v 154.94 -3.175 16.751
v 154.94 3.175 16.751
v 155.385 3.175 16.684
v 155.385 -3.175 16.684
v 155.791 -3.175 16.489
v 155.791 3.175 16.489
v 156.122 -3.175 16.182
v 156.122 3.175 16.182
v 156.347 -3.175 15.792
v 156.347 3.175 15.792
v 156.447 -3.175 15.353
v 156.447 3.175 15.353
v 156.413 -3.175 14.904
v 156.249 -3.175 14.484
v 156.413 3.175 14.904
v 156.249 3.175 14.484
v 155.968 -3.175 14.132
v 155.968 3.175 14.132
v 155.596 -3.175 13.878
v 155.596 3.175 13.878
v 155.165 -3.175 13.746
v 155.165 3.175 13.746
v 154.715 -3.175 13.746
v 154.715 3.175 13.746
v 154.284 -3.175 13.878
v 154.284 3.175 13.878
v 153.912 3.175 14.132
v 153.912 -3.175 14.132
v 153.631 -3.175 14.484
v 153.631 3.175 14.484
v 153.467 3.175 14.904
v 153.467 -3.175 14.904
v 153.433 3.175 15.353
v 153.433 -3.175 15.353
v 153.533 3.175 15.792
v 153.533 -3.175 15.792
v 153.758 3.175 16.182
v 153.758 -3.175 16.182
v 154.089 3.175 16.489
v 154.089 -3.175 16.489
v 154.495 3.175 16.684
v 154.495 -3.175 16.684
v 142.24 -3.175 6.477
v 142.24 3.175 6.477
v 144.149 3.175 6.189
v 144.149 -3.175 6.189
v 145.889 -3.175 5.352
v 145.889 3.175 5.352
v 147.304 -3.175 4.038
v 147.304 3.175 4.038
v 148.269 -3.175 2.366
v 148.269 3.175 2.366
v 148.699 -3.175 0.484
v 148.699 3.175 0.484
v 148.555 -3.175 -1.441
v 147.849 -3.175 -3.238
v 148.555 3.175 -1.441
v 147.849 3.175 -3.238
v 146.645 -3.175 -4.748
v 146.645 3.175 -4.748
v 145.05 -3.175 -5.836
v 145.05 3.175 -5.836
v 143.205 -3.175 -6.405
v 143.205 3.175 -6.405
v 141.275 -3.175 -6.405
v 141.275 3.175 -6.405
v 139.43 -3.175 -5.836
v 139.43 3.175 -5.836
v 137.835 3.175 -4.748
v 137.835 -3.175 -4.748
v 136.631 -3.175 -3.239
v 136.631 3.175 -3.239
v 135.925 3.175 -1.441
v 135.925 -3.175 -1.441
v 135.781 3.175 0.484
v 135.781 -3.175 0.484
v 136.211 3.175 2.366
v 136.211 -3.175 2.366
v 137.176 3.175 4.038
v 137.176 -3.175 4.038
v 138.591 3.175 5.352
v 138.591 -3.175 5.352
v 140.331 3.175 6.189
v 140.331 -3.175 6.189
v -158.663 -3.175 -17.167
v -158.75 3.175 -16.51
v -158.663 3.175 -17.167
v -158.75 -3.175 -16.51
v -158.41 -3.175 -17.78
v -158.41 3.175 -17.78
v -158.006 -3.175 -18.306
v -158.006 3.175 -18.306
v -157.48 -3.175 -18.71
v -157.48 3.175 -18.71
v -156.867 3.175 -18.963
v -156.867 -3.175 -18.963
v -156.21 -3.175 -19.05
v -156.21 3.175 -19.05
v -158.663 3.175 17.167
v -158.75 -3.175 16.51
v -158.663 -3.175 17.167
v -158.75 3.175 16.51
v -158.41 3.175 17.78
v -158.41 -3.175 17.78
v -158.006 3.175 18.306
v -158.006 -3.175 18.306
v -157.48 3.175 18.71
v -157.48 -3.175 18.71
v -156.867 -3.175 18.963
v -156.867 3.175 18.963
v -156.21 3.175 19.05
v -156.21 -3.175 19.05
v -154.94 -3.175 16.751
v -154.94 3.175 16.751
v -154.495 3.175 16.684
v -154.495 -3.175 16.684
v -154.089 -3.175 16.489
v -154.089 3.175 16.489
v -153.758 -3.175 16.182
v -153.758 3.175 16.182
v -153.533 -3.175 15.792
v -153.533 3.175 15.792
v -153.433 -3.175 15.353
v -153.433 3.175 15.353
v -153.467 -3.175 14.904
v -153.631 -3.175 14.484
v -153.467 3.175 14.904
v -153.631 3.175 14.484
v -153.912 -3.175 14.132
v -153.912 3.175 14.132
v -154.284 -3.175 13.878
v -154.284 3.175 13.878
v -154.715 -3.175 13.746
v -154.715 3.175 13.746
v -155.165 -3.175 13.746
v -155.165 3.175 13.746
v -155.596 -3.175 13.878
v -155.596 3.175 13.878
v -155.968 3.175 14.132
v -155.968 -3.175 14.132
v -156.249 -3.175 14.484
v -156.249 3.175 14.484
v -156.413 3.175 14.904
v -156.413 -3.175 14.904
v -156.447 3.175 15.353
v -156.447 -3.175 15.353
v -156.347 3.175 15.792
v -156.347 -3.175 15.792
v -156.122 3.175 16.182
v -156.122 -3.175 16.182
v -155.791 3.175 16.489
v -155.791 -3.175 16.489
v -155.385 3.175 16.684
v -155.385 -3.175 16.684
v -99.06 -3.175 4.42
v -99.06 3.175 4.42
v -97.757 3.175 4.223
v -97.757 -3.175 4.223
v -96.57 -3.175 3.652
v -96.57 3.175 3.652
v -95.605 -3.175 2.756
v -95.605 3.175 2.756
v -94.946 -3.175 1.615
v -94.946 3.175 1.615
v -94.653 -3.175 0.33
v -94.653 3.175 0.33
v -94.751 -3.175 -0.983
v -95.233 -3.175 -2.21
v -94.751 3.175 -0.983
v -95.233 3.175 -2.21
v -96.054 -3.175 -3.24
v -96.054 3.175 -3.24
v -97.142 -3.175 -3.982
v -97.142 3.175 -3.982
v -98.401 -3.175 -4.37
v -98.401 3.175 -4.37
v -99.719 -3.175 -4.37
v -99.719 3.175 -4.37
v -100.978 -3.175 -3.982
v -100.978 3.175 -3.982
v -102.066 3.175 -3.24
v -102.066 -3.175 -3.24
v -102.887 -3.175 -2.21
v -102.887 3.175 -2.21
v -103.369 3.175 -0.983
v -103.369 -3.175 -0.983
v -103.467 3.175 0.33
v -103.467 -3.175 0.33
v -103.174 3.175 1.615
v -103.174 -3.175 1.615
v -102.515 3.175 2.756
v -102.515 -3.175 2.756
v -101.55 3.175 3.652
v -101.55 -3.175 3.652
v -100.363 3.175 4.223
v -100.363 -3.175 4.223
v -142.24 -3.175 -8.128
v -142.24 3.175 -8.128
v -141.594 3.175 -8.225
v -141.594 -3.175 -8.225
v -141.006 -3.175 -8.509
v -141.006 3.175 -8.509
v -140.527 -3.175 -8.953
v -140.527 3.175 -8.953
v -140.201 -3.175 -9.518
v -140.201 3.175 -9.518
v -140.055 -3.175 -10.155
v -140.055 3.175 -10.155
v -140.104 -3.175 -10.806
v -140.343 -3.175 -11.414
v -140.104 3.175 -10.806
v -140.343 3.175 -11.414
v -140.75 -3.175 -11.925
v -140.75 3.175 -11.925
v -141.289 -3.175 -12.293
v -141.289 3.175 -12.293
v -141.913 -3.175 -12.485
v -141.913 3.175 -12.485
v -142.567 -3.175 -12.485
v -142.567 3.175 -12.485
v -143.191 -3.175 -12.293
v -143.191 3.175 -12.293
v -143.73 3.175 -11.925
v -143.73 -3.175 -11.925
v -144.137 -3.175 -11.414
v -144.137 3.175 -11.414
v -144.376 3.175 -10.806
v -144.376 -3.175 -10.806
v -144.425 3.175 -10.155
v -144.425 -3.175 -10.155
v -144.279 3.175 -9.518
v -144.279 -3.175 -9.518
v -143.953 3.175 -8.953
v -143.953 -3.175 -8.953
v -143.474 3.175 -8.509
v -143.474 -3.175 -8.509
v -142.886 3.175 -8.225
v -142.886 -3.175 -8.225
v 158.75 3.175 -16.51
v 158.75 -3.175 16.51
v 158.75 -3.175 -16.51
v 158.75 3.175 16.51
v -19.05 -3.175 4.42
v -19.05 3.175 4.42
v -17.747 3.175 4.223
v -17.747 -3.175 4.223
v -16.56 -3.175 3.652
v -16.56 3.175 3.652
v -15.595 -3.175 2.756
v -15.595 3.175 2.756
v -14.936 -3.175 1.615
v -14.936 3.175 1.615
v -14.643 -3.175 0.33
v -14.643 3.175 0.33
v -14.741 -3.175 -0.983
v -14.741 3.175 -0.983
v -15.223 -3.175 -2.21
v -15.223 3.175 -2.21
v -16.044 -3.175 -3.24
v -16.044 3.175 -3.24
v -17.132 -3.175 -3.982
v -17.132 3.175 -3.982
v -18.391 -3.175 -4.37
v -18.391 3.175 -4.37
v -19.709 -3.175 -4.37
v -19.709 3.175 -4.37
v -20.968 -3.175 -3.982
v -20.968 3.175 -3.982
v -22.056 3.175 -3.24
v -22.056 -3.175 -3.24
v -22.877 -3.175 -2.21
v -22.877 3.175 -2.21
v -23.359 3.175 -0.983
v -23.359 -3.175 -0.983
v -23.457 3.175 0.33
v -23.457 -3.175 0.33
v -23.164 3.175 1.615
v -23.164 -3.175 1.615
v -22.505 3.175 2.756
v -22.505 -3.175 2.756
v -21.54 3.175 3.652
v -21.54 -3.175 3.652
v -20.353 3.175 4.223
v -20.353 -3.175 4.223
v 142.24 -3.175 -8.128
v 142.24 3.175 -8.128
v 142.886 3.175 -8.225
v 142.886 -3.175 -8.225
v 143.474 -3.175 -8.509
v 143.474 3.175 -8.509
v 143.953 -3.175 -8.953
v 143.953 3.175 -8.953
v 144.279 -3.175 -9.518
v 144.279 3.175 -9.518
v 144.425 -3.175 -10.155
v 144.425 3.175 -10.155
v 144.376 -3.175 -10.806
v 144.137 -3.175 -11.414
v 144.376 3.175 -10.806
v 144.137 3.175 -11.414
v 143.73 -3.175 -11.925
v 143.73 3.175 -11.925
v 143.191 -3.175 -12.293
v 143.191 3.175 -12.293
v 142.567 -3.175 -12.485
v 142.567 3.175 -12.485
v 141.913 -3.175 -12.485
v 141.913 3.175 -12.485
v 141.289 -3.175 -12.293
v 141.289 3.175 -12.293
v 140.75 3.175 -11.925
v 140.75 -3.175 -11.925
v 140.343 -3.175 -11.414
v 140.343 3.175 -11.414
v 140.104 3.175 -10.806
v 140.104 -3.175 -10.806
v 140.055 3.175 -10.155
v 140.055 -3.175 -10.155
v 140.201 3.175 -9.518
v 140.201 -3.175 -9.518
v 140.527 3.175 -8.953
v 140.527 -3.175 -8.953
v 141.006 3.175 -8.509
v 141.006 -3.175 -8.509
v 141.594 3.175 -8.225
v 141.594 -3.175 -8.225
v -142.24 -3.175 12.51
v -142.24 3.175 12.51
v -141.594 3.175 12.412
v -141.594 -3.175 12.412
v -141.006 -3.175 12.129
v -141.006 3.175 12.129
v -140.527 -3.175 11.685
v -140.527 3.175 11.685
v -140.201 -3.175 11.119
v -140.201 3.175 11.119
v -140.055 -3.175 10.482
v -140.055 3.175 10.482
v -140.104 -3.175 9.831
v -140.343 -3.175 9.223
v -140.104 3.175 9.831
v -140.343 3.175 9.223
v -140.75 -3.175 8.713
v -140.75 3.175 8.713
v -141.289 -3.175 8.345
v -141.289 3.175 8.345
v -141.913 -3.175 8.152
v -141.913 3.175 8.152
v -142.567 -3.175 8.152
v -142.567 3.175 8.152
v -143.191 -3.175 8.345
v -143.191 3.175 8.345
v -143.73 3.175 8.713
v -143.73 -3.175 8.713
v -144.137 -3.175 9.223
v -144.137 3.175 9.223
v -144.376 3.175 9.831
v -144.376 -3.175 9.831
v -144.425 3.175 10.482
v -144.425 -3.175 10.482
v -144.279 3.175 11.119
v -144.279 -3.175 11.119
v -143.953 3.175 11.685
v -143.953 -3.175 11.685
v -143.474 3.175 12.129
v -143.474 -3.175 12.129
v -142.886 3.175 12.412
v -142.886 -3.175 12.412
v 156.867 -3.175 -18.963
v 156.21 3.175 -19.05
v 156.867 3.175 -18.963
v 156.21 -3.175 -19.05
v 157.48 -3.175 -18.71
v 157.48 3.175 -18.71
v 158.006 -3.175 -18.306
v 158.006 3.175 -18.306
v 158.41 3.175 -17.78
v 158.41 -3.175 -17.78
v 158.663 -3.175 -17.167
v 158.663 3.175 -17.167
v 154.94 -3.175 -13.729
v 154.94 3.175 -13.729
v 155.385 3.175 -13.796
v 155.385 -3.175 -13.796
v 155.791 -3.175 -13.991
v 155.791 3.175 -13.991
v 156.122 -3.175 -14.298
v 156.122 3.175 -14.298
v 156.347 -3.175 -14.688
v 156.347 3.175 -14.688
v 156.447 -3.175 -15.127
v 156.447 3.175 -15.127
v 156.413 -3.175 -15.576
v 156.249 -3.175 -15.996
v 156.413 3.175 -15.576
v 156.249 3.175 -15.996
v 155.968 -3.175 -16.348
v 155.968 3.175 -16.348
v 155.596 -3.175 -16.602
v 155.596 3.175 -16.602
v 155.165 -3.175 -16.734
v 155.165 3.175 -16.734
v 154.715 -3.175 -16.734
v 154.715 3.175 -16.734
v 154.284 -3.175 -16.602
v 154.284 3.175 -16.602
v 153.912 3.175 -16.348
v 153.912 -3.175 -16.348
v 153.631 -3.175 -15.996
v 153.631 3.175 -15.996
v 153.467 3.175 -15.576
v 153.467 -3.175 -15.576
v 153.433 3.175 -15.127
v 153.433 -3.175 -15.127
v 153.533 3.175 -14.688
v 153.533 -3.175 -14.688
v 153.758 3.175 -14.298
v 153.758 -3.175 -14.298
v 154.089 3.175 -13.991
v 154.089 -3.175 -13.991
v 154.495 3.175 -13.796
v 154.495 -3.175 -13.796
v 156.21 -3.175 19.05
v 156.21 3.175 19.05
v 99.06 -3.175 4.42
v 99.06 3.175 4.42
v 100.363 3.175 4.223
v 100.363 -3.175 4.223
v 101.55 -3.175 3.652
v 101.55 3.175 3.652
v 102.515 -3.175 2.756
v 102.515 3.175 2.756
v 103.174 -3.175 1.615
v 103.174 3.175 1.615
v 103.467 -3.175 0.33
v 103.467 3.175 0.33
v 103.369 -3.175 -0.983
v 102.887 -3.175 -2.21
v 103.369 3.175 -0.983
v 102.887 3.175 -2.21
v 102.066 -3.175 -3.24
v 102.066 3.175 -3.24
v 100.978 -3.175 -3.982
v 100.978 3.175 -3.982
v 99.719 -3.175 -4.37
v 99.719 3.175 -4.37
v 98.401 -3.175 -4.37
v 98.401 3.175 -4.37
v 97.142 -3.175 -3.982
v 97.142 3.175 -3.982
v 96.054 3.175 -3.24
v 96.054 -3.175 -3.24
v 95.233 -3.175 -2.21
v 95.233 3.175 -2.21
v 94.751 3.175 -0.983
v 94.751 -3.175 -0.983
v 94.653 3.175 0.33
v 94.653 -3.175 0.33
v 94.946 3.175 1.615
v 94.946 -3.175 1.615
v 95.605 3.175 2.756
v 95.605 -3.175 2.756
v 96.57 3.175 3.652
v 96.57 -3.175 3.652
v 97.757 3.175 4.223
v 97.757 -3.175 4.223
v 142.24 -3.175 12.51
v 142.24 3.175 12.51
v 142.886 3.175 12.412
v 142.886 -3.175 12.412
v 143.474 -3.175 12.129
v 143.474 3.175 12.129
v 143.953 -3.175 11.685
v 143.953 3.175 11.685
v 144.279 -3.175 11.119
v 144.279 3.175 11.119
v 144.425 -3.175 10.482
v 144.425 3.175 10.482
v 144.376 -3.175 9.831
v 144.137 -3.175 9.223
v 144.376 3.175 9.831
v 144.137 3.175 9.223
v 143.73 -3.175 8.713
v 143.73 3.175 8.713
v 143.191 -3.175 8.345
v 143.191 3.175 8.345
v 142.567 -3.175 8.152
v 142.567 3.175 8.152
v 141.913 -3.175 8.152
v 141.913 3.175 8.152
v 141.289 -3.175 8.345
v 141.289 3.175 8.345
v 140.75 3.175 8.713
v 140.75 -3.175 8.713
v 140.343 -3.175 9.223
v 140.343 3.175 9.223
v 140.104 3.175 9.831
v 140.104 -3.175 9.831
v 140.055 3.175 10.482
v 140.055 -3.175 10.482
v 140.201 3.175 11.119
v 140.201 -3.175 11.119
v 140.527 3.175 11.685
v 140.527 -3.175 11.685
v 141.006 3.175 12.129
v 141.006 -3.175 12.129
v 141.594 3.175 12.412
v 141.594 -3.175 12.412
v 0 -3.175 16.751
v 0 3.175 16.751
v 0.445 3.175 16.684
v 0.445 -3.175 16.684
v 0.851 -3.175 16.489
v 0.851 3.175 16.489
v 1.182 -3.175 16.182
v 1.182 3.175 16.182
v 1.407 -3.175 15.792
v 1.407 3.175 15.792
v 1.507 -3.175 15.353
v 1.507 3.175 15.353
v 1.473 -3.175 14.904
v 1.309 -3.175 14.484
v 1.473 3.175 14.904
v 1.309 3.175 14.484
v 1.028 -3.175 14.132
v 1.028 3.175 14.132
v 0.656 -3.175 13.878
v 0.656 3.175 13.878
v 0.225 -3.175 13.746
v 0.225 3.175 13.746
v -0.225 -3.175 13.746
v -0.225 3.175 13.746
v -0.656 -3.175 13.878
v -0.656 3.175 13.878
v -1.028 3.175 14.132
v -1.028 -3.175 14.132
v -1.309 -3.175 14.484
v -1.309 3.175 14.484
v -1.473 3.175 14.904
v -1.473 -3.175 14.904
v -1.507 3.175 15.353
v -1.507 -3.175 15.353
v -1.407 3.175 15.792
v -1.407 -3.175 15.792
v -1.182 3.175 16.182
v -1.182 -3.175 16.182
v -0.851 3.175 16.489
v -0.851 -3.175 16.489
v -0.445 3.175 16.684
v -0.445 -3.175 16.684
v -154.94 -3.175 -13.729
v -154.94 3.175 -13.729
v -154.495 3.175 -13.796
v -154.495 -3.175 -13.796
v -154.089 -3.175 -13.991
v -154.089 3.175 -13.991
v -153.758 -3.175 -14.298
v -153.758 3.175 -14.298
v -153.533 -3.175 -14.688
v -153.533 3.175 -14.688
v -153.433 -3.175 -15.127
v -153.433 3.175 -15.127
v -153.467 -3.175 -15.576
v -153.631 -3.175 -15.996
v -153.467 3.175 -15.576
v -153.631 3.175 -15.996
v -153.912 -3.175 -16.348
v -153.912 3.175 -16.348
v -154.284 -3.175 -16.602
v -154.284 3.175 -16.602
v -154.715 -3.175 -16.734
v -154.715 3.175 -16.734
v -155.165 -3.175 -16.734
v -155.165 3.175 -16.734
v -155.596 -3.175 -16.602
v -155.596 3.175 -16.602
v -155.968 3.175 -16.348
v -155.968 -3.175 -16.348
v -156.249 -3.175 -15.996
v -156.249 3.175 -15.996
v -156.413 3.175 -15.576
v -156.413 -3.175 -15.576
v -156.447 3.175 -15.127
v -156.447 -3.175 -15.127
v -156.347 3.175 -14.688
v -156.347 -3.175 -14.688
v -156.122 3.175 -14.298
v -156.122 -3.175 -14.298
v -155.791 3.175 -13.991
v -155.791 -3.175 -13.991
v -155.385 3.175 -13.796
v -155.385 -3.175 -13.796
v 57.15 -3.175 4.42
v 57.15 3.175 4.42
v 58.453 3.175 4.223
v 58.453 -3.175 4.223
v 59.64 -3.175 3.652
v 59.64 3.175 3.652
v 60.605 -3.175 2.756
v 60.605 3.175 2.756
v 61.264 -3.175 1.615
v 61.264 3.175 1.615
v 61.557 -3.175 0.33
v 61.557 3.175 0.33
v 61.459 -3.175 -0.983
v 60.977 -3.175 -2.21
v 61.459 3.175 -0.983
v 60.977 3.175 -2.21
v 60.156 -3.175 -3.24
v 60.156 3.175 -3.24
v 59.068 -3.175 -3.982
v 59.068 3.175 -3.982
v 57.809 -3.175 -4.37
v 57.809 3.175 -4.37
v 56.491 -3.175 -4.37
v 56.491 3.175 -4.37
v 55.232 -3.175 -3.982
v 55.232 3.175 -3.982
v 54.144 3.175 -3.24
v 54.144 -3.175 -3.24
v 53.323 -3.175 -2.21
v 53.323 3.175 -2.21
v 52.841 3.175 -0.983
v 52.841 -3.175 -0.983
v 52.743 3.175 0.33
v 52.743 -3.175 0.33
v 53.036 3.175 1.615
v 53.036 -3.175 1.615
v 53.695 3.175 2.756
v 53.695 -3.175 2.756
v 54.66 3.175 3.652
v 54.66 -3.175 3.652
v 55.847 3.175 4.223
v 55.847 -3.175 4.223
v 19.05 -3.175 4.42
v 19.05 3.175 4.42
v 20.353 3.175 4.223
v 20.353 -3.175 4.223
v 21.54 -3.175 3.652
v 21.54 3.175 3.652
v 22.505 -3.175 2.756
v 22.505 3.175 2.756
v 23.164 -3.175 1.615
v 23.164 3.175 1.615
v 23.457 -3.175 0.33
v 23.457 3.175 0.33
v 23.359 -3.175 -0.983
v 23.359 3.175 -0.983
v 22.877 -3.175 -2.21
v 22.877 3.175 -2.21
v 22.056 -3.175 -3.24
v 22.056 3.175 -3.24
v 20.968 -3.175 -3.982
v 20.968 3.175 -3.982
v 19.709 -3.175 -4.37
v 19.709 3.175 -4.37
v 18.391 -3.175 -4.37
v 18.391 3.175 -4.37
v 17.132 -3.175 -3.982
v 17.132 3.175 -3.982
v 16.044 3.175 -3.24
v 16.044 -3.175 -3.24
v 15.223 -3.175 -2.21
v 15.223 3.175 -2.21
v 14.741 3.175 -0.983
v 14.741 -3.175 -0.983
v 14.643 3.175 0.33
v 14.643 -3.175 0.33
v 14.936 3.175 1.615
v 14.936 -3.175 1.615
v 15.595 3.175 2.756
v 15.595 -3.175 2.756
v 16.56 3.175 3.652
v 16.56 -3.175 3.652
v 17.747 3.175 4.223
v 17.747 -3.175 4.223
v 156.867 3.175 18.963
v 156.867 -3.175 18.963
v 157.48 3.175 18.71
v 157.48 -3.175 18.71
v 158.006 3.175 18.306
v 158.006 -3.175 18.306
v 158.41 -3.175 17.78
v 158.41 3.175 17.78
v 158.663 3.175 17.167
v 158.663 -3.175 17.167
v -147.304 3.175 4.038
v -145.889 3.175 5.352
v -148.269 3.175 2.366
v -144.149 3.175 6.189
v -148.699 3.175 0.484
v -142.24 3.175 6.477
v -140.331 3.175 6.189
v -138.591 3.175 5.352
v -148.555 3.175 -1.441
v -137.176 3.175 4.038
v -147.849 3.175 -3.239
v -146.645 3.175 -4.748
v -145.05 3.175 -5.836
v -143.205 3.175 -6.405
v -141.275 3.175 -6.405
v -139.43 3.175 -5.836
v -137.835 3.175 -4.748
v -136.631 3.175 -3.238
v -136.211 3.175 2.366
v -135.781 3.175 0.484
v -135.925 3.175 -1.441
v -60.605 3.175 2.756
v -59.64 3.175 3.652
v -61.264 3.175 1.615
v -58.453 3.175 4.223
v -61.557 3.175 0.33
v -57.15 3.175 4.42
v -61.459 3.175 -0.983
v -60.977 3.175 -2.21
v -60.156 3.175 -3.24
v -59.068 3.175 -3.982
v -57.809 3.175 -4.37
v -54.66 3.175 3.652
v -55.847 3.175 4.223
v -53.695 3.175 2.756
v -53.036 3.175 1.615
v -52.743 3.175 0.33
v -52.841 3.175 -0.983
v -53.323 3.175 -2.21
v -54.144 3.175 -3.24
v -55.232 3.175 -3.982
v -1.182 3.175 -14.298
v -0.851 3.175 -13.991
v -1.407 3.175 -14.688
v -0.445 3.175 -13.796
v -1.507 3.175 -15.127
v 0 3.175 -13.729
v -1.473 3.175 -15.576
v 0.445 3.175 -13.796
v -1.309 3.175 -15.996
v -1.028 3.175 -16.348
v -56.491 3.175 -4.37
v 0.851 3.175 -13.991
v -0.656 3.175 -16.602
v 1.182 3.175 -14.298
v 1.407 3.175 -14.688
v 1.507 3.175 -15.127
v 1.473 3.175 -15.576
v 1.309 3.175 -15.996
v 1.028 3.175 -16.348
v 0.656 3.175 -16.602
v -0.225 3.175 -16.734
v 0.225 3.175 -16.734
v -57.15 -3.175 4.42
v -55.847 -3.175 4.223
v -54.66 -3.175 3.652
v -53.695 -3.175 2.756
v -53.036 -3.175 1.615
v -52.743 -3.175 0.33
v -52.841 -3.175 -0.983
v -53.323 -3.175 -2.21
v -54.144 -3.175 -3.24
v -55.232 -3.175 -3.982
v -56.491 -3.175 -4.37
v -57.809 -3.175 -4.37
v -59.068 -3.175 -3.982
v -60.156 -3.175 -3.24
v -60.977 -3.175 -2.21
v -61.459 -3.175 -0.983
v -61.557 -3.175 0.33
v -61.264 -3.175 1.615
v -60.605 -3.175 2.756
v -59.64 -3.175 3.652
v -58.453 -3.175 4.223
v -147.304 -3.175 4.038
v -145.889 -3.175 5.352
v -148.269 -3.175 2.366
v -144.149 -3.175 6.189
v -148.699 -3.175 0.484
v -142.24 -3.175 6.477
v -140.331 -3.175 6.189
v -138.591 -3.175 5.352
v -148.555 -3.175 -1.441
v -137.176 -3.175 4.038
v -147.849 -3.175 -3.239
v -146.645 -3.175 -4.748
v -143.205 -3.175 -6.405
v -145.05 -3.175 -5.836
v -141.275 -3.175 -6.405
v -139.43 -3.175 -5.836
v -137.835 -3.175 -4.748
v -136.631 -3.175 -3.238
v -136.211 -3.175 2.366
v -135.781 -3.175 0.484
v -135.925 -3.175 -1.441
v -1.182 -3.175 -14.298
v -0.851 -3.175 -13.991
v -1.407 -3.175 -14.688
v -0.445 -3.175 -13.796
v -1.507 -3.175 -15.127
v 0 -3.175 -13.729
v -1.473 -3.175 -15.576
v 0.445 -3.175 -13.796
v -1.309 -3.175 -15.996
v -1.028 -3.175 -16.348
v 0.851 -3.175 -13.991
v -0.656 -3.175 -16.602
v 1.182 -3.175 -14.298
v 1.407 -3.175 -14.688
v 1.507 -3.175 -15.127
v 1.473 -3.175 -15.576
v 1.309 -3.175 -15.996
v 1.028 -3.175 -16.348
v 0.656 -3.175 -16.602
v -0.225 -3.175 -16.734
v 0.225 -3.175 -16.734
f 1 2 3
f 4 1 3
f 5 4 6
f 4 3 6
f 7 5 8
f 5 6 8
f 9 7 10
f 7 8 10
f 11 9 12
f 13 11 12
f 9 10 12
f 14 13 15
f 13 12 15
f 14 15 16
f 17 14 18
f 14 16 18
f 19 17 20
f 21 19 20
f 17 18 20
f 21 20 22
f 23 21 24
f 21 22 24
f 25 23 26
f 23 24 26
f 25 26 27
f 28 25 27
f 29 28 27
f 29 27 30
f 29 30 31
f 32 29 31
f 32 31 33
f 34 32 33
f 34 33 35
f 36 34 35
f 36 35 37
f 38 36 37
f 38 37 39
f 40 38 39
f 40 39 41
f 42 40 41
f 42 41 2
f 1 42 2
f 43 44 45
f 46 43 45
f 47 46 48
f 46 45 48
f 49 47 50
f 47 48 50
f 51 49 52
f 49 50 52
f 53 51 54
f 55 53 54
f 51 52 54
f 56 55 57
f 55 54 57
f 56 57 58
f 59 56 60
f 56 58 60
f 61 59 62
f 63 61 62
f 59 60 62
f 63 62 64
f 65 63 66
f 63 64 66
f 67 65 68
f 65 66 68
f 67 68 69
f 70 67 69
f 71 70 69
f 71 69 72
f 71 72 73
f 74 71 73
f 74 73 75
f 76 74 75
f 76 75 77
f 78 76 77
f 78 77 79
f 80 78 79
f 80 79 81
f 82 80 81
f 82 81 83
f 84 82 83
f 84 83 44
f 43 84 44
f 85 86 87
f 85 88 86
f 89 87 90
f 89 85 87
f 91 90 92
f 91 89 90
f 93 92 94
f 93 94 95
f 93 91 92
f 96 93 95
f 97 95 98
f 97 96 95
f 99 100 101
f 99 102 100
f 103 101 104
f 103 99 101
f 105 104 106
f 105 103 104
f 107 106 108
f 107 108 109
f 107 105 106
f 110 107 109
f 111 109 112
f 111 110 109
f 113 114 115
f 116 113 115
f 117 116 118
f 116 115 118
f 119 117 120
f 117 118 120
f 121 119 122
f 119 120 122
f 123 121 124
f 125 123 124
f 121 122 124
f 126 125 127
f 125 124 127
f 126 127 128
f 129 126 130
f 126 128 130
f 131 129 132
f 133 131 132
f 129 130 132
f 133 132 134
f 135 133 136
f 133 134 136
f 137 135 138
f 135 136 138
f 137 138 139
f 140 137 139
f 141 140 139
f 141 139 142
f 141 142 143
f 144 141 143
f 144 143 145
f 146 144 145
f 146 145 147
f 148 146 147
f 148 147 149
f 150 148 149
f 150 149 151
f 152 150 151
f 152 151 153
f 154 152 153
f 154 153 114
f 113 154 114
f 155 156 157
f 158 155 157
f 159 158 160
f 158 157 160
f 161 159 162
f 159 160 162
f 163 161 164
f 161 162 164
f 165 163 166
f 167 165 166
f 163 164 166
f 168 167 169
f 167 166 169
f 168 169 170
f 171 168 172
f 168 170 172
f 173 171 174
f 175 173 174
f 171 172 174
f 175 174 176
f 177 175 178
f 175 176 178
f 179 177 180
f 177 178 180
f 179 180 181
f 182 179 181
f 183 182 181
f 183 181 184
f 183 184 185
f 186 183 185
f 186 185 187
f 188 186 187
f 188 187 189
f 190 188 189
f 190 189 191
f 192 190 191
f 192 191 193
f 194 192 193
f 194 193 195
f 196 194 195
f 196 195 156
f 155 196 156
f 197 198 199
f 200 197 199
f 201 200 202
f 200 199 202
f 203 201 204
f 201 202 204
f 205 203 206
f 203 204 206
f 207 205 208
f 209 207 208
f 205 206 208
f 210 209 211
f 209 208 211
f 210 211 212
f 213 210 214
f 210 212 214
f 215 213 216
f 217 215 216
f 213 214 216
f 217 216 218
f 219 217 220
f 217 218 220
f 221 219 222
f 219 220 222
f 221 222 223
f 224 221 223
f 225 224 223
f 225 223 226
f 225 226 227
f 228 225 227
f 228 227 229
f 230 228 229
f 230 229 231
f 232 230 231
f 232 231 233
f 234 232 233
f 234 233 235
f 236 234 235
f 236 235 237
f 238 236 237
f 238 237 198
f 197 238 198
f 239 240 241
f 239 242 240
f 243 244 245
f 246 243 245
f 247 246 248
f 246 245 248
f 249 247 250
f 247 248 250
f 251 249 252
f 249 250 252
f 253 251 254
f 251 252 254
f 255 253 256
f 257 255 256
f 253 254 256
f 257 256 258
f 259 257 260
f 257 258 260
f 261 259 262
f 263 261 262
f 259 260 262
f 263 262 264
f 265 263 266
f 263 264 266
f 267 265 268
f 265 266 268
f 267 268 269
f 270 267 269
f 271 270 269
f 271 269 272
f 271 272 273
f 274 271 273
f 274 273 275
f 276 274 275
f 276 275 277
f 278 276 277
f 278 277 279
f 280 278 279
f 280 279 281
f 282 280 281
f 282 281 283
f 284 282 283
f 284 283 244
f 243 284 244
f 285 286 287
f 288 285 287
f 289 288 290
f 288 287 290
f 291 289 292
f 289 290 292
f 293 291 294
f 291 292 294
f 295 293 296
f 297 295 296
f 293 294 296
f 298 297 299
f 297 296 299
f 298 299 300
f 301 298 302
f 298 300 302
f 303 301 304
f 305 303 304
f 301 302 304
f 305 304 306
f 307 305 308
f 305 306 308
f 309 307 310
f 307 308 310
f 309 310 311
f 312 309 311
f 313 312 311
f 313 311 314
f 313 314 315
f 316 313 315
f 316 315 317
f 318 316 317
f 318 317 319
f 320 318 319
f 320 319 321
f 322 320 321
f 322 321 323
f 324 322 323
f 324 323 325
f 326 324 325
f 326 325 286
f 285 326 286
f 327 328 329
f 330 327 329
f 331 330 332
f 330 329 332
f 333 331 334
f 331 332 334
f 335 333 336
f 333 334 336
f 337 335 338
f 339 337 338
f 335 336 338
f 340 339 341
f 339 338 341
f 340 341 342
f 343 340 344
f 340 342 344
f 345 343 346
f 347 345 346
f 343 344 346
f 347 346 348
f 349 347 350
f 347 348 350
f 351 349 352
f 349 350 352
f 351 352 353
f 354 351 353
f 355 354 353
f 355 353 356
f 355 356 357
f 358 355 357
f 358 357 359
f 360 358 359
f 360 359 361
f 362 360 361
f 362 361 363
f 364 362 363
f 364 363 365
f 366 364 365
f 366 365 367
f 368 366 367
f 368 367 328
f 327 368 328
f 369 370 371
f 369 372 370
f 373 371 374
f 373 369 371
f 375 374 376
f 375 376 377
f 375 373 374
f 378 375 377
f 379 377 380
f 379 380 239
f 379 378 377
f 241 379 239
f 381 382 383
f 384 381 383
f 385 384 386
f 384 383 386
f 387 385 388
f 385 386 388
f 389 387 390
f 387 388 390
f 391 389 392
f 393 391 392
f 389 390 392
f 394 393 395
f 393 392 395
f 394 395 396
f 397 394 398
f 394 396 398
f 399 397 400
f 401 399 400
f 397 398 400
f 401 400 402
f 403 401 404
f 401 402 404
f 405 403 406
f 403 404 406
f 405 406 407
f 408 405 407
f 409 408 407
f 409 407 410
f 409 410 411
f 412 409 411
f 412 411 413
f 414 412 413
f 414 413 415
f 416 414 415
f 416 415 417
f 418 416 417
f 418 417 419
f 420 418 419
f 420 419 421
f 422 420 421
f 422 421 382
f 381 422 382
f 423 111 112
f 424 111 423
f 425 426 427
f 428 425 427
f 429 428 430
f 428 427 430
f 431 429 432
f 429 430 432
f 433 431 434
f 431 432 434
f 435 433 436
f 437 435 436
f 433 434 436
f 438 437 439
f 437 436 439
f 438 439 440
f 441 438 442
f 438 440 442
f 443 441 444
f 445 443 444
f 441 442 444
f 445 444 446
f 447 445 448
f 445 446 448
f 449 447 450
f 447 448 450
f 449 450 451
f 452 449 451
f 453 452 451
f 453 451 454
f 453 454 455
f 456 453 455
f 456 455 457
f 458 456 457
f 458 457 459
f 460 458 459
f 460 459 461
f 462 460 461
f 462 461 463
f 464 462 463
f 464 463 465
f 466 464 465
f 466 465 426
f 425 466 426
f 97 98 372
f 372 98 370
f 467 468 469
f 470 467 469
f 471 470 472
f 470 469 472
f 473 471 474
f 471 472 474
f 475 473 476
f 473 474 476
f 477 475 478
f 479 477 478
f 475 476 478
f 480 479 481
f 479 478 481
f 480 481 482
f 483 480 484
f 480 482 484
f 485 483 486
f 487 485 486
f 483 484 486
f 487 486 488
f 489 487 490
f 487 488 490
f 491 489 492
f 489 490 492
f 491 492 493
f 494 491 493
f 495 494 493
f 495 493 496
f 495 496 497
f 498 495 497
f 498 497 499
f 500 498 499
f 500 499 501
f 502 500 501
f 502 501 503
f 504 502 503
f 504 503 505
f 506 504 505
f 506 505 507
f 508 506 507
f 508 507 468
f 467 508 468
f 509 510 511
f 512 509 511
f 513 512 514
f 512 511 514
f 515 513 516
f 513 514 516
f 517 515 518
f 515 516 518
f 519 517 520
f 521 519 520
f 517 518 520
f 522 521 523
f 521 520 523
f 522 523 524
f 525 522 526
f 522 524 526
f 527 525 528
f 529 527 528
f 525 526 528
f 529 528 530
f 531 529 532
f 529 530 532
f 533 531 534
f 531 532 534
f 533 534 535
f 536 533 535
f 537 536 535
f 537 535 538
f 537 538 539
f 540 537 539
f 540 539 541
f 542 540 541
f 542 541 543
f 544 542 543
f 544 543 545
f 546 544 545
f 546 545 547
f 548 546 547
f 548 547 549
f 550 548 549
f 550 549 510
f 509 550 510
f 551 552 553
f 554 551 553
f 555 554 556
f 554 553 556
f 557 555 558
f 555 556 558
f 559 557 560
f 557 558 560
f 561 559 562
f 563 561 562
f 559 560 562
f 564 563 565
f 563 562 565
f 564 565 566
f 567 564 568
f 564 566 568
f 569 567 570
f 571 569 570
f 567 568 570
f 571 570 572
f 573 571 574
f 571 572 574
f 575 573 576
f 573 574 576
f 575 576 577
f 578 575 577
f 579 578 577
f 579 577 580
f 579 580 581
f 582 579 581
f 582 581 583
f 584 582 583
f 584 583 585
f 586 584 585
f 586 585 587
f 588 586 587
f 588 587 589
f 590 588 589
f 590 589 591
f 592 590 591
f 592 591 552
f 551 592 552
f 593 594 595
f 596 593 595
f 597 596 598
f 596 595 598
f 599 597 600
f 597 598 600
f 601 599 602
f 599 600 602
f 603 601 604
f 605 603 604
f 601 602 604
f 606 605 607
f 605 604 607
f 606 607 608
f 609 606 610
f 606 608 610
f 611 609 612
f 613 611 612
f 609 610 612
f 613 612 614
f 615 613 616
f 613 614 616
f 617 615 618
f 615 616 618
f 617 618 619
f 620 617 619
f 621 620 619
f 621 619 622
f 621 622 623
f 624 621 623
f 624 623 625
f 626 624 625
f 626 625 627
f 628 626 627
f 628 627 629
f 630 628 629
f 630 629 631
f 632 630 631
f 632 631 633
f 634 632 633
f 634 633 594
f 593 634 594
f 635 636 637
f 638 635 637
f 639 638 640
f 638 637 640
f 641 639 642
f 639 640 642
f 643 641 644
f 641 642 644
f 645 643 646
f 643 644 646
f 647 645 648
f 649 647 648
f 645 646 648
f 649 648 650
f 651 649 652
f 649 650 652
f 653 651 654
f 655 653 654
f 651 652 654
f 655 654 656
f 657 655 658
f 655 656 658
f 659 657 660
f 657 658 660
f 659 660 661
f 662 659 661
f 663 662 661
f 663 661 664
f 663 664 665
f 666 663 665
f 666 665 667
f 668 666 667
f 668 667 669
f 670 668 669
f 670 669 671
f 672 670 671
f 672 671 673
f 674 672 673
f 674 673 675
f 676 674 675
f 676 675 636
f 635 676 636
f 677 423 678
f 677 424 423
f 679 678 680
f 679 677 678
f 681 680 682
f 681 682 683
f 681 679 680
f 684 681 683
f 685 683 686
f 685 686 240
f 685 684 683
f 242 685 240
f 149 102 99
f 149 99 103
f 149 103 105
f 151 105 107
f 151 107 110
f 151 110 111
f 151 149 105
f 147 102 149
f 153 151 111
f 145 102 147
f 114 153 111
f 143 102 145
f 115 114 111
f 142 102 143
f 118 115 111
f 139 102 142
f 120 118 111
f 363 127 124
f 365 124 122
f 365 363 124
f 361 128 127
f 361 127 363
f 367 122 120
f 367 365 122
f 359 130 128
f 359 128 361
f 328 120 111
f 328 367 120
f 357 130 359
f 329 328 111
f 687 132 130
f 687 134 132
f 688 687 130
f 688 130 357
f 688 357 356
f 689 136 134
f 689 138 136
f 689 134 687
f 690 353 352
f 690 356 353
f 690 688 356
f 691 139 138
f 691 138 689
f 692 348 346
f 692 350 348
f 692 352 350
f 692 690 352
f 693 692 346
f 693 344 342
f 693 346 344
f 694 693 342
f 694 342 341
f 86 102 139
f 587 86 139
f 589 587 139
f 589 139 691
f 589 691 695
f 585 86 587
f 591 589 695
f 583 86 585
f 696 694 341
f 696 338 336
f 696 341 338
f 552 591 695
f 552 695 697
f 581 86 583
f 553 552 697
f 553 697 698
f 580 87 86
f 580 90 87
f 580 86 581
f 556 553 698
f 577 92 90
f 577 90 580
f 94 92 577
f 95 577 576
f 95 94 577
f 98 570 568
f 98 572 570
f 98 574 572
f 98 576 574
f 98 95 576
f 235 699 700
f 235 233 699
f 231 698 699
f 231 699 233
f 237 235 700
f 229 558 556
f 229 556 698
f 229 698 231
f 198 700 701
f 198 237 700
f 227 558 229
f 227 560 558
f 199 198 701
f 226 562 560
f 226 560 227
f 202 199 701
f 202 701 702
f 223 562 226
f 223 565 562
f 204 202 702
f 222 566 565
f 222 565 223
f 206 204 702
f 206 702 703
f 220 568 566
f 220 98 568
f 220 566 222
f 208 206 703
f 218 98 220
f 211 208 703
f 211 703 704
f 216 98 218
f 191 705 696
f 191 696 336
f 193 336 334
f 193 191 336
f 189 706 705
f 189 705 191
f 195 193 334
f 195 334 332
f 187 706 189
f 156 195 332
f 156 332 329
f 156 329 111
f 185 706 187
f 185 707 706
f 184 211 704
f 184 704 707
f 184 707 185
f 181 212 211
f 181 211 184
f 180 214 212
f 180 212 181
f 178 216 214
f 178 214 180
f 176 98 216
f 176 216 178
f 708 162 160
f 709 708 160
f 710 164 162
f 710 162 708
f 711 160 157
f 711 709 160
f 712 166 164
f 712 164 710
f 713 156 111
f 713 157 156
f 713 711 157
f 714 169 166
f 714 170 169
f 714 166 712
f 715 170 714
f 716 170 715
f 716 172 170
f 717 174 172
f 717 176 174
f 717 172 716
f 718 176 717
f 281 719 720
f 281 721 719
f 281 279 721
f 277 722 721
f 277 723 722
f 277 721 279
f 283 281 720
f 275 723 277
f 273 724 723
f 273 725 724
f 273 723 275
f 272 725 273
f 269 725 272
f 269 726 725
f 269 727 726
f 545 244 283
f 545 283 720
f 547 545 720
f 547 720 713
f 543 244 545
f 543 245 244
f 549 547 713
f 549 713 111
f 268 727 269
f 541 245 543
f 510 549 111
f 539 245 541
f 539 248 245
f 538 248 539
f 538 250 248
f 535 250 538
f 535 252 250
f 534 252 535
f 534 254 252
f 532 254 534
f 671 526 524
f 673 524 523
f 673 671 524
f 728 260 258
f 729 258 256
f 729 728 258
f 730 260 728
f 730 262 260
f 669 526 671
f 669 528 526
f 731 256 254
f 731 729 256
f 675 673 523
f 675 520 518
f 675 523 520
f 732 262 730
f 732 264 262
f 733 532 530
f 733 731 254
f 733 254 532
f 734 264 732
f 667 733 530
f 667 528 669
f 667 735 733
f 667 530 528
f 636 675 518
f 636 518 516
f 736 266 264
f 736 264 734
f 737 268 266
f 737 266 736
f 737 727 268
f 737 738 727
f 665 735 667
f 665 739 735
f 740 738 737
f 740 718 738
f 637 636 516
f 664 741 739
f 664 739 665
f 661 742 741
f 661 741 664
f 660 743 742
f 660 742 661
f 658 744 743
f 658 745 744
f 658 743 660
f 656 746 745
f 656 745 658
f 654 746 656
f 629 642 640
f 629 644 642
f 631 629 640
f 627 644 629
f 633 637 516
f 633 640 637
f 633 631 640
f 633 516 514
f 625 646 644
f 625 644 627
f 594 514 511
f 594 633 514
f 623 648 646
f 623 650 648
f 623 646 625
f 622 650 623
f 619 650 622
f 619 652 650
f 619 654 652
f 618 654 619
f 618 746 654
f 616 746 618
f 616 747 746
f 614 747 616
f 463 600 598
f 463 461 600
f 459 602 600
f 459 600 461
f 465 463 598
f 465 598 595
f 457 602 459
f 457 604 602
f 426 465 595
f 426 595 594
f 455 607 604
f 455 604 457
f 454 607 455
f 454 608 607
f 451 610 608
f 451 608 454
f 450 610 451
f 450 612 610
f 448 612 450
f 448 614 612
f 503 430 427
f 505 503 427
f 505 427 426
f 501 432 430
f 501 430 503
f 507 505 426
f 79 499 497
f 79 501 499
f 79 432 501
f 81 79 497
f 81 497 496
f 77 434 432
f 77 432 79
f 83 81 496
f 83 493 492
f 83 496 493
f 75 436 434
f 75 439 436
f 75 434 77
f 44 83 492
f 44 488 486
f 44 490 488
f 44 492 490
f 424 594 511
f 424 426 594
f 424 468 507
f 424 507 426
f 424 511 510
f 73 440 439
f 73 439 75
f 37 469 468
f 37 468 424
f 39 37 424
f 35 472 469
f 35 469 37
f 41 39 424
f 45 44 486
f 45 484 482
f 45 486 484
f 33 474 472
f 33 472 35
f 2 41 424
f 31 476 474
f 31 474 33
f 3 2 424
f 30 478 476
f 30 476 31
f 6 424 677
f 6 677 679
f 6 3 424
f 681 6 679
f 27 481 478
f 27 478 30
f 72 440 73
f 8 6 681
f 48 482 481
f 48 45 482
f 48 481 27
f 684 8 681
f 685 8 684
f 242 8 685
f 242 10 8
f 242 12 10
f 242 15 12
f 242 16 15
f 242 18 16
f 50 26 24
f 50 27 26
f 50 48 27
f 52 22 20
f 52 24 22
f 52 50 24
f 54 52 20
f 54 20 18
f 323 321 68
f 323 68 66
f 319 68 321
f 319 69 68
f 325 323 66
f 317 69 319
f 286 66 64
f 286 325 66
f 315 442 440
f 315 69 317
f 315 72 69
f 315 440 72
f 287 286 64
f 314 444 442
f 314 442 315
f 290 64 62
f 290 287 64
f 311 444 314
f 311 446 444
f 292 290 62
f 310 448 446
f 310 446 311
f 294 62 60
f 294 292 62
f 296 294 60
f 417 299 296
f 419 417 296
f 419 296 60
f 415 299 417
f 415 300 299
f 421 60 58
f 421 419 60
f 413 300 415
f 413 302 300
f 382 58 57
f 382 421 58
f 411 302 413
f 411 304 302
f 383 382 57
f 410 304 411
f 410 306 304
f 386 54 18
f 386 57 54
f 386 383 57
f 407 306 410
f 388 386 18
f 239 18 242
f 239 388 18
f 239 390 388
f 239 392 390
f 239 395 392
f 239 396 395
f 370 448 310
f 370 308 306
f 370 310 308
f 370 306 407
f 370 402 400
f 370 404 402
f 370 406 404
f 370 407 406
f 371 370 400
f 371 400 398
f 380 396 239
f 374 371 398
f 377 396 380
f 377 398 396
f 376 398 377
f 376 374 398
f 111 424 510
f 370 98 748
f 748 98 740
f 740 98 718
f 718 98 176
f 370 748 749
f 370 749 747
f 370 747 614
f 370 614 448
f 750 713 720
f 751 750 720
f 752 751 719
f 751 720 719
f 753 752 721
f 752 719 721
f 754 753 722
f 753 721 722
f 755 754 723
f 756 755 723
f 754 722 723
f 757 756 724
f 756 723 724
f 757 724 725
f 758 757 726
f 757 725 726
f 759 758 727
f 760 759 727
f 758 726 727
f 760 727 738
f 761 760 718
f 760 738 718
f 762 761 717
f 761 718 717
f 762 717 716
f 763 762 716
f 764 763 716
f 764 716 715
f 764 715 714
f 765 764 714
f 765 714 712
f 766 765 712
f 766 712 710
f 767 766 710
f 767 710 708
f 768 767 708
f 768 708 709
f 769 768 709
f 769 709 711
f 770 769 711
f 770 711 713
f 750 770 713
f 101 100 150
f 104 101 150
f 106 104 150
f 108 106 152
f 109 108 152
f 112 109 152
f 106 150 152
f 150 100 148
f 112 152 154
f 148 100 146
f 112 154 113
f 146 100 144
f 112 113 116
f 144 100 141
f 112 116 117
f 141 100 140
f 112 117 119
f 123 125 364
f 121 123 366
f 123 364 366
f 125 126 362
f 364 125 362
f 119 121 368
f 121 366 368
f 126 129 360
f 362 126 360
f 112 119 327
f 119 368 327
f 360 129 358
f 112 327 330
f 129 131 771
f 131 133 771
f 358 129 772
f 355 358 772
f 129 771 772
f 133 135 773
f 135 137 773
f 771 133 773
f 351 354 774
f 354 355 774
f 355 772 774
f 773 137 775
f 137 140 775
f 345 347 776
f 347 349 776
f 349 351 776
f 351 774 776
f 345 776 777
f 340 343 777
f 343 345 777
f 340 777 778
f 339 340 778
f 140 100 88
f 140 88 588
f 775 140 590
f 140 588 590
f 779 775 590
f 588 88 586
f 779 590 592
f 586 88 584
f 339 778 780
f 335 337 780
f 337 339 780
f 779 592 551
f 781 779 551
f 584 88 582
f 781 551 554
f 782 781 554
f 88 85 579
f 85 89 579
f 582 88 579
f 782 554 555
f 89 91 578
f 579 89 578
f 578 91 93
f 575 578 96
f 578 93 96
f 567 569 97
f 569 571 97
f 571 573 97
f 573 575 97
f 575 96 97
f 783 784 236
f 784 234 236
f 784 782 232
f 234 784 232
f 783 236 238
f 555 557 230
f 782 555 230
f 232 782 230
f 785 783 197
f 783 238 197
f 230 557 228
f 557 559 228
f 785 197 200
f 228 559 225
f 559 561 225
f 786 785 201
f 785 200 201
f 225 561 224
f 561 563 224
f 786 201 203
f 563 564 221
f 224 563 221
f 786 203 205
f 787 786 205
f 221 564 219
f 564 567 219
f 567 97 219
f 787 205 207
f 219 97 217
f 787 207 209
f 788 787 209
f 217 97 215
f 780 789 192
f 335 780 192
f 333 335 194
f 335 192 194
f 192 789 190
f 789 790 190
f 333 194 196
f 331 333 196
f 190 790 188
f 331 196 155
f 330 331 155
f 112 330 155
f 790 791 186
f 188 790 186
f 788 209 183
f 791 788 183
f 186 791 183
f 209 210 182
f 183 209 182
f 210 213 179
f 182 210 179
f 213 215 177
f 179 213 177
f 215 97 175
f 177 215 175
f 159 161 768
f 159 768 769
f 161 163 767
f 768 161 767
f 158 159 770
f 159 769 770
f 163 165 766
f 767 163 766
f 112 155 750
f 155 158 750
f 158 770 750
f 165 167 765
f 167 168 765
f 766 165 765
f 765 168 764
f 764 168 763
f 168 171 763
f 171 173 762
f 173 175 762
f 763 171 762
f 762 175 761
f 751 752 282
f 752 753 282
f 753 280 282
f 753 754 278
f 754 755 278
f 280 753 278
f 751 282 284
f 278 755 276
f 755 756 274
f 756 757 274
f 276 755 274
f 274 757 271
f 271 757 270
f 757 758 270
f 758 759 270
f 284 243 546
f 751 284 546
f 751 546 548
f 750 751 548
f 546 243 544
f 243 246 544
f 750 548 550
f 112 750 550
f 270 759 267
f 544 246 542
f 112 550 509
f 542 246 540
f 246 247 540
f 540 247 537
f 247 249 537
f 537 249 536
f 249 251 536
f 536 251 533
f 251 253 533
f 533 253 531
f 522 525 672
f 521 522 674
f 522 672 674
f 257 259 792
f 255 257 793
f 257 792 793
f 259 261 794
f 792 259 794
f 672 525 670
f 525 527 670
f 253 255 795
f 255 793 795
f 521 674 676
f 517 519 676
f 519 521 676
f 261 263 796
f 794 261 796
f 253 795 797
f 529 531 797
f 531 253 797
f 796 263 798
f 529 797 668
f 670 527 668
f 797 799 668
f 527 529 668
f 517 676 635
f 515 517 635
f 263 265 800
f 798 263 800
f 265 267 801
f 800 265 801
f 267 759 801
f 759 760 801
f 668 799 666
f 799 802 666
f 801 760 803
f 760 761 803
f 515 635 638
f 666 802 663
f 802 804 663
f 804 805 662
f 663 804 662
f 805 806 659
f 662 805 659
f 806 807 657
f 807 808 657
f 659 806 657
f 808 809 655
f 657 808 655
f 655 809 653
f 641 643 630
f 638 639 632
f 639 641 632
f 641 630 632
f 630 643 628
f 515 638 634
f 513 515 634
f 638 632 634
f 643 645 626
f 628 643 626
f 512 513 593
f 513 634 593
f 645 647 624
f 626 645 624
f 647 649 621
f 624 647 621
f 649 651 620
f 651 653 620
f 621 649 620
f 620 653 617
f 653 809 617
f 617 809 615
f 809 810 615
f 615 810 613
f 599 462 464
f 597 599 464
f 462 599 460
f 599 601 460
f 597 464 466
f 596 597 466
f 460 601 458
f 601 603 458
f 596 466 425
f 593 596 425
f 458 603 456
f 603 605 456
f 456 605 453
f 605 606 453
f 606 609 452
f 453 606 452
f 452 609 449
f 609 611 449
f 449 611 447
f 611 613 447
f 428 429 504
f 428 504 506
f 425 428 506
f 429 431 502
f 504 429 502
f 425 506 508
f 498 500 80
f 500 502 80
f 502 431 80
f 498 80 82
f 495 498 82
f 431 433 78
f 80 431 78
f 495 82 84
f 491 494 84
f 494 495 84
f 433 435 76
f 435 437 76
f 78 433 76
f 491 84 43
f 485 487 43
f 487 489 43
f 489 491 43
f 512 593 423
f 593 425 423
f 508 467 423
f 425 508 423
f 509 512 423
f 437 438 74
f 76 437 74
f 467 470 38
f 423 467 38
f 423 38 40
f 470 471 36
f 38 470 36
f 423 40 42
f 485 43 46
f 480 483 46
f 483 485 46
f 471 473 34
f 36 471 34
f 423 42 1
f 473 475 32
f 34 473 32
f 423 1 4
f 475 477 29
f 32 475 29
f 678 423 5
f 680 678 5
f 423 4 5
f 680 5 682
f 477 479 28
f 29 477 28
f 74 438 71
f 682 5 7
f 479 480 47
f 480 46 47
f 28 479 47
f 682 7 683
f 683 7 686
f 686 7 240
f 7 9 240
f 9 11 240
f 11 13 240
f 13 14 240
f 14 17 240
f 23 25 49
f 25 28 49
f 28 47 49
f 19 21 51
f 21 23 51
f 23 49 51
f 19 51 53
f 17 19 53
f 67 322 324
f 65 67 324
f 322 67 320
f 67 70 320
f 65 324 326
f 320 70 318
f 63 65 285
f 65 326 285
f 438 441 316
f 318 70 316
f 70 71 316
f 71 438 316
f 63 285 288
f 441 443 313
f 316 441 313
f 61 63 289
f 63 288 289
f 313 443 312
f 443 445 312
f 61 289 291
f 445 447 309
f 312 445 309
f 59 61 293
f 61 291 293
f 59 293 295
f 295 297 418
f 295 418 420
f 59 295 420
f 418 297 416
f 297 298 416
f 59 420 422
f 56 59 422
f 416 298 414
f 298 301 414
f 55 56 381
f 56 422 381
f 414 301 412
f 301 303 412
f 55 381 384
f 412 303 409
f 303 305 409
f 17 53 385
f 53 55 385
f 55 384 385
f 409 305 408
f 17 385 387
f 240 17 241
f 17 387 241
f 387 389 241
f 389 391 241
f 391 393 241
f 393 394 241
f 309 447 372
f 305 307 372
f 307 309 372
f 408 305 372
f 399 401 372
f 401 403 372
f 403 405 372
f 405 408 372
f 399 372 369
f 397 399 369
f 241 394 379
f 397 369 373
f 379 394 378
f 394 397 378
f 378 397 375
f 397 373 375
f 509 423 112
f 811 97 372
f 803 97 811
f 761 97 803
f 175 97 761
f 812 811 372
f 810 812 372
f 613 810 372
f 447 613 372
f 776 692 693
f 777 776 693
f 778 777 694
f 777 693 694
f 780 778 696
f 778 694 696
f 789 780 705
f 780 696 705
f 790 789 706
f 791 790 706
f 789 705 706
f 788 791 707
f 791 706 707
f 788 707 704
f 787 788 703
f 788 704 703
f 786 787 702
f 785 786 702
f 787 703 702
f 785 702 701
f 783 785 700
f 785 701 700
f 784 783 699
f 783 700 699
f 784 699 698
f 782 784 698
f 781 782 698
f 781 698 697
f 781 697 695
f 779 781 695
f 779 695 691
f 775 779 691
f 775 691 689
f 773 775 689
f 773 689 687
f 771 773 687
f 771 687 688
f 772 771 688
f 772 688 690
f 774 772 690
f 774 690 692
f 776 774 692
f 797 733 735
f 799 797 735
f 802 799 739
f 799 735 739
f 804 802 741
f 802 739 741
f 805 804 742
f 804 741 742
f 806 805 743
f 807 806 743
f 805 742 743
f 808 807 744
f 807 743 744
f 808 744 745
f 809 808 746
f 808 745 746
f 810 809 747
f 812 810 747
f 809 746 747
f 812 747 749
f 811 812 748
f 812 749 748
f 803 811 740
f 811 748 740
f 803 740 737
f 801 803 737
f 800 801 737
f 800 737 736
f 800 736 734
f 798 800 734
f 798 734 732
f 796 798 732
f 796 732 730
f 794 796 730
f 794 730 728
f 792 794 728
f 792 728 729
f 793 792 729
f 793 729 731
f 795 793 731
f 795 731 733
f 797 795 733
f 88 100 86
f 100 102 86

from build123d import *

# Parameters (mm, degrees)
SKETCH1_W           = 317.5
SKETCH1_H           = 38.1
BOSS_EXTRUDE1_DEPTH = 3.175
SKETCH2_R           = 4.4196
SKETCH2_R_2         = 6.477
SKETCH2_R_3         = 2.19075
CUT_EXTRUDE1_DEPTH  = 161.014960238
SKETCH3_R           = 1.5113
CUT_EXTRUDE2_DEPTH  = 161.014960238
FILLET1_R           = 2.54


with BuildPart() as part:
    # Sketch1 → Boss-Extrude1 (new, symmetric)
    with BuildSketch(Plane(origin=(0, 0, 0), x_dir=(1, 0, 0), z_dir=(0, 1, 0))):
        Rectangle(SKETCH1_W, SKETCH1_H)
    extrude(amount=BOSS_EXTRUDE1_DEPTH, both=True)

    # Sketch2 → Cut-Extrude1 (cut, through all)
    with BuildSketch(Plane(origin=(0, 3.175, 0), x_dir=(1, 0, 0), z_dir=(0, 1, 0))):
        with Locations(Location((-99.06, 0, 0), (0, 0, 270))):
            Circle(SKETCH2_R)
        with Locations(Location((-57.15, 0, 0), (0, 0, 270))):
            Circle(SKETCH2_R)
        with Locations(Location((-19.05, 0, 0), (0, 0, 270))):
            Circle(SKETCH2_R)
        with Locations(Location((19.05, 0, 0), (0, 0, 270))):
            Circle(SKETCH2_R)
        with Locations(Location((57.15, 0, 0), (0, 0, 270))):
            Circle(SKETCH2_R)
        with Locations(Location((-142.24, 0, 0), (0, 0, 270))):
            Circle(SKETCH2_R_2)
        with Locations(Location((-142.24, -10.31875, 0), (0, 0, 270))):
            Circle(SKETCH2_R_3)
        with Locations(Location((-142.24, 10.31875, 0), (0, 0, 270))):
            Circle(SKETCH2_R_3)
        with Locations(Location((142.24, 0, 0), (0, 0, 270))):
            Circle(SKETCH2_R_2)
        with Locations(Location((142.24, -10.31875, 0), (0, 0, 270))):
            Circle(SKETCH2_R_3)
        with Locations(Location((142.24, 10.31875, 0), (0, 0, 270))):
            Circle(SKETCH2_R_3)
        with Locations(Location((99.06, 0, 0), (0, 0, 270))):
            Circle(SKETCH2_R)
    extrude(amount=-CUT_EXTRUDE1_DEPTH, mode=Mode.SUBTRACT)

    # Sketch3 → Cut-Extrude2 (cut, through all)
    with BuildSketch(Plane(origin=(0, 3.175, 0), x_dir=(1, 0, 0), z_dir=(0, 1, 0))):
        with Locations(Location((-154.94, 15.24, 0), (0, 0, 270))):
            Circle(SKETCH3_R)
        with Locations(Location((-154.94, -15.24, 0), (0, 0, 270))):
            Circle(SKETCH3_R)
        with Locations(Location((154.94, -15.24, 0), (0, 0, 270))):
            Circle(SKETCH3_R)
        with Locations(Location((154.94, 15.24, 0), (0, 0, 270))):
            Circle(SKETCH3_R)
        with Locations(Location((0, 15.24, 0), (0, 0, 270))):
            Circle(SKETCH3_R)
        with Locations(Location((0, -15.24, 0), (0, 0, 270))):
            Circle(SKETCH3_R)
    extrude(amount=-CUT_EXTRUDE2_DEPTH, mode=Mode.SUBTRACT)

    # Fillet1
    fillet1_edges = [part.edges().sort_by_distance(p)[0] for p in [
        (158.75, 0, 19.05),
        (-158.75, 0, 19.05),
        (-158.75, 0, -19.05),
        (158.75, 0, -19.05),
    ]]
    fillet(fillet1_edges, radius=FILLET1_R)


solid = part.part
